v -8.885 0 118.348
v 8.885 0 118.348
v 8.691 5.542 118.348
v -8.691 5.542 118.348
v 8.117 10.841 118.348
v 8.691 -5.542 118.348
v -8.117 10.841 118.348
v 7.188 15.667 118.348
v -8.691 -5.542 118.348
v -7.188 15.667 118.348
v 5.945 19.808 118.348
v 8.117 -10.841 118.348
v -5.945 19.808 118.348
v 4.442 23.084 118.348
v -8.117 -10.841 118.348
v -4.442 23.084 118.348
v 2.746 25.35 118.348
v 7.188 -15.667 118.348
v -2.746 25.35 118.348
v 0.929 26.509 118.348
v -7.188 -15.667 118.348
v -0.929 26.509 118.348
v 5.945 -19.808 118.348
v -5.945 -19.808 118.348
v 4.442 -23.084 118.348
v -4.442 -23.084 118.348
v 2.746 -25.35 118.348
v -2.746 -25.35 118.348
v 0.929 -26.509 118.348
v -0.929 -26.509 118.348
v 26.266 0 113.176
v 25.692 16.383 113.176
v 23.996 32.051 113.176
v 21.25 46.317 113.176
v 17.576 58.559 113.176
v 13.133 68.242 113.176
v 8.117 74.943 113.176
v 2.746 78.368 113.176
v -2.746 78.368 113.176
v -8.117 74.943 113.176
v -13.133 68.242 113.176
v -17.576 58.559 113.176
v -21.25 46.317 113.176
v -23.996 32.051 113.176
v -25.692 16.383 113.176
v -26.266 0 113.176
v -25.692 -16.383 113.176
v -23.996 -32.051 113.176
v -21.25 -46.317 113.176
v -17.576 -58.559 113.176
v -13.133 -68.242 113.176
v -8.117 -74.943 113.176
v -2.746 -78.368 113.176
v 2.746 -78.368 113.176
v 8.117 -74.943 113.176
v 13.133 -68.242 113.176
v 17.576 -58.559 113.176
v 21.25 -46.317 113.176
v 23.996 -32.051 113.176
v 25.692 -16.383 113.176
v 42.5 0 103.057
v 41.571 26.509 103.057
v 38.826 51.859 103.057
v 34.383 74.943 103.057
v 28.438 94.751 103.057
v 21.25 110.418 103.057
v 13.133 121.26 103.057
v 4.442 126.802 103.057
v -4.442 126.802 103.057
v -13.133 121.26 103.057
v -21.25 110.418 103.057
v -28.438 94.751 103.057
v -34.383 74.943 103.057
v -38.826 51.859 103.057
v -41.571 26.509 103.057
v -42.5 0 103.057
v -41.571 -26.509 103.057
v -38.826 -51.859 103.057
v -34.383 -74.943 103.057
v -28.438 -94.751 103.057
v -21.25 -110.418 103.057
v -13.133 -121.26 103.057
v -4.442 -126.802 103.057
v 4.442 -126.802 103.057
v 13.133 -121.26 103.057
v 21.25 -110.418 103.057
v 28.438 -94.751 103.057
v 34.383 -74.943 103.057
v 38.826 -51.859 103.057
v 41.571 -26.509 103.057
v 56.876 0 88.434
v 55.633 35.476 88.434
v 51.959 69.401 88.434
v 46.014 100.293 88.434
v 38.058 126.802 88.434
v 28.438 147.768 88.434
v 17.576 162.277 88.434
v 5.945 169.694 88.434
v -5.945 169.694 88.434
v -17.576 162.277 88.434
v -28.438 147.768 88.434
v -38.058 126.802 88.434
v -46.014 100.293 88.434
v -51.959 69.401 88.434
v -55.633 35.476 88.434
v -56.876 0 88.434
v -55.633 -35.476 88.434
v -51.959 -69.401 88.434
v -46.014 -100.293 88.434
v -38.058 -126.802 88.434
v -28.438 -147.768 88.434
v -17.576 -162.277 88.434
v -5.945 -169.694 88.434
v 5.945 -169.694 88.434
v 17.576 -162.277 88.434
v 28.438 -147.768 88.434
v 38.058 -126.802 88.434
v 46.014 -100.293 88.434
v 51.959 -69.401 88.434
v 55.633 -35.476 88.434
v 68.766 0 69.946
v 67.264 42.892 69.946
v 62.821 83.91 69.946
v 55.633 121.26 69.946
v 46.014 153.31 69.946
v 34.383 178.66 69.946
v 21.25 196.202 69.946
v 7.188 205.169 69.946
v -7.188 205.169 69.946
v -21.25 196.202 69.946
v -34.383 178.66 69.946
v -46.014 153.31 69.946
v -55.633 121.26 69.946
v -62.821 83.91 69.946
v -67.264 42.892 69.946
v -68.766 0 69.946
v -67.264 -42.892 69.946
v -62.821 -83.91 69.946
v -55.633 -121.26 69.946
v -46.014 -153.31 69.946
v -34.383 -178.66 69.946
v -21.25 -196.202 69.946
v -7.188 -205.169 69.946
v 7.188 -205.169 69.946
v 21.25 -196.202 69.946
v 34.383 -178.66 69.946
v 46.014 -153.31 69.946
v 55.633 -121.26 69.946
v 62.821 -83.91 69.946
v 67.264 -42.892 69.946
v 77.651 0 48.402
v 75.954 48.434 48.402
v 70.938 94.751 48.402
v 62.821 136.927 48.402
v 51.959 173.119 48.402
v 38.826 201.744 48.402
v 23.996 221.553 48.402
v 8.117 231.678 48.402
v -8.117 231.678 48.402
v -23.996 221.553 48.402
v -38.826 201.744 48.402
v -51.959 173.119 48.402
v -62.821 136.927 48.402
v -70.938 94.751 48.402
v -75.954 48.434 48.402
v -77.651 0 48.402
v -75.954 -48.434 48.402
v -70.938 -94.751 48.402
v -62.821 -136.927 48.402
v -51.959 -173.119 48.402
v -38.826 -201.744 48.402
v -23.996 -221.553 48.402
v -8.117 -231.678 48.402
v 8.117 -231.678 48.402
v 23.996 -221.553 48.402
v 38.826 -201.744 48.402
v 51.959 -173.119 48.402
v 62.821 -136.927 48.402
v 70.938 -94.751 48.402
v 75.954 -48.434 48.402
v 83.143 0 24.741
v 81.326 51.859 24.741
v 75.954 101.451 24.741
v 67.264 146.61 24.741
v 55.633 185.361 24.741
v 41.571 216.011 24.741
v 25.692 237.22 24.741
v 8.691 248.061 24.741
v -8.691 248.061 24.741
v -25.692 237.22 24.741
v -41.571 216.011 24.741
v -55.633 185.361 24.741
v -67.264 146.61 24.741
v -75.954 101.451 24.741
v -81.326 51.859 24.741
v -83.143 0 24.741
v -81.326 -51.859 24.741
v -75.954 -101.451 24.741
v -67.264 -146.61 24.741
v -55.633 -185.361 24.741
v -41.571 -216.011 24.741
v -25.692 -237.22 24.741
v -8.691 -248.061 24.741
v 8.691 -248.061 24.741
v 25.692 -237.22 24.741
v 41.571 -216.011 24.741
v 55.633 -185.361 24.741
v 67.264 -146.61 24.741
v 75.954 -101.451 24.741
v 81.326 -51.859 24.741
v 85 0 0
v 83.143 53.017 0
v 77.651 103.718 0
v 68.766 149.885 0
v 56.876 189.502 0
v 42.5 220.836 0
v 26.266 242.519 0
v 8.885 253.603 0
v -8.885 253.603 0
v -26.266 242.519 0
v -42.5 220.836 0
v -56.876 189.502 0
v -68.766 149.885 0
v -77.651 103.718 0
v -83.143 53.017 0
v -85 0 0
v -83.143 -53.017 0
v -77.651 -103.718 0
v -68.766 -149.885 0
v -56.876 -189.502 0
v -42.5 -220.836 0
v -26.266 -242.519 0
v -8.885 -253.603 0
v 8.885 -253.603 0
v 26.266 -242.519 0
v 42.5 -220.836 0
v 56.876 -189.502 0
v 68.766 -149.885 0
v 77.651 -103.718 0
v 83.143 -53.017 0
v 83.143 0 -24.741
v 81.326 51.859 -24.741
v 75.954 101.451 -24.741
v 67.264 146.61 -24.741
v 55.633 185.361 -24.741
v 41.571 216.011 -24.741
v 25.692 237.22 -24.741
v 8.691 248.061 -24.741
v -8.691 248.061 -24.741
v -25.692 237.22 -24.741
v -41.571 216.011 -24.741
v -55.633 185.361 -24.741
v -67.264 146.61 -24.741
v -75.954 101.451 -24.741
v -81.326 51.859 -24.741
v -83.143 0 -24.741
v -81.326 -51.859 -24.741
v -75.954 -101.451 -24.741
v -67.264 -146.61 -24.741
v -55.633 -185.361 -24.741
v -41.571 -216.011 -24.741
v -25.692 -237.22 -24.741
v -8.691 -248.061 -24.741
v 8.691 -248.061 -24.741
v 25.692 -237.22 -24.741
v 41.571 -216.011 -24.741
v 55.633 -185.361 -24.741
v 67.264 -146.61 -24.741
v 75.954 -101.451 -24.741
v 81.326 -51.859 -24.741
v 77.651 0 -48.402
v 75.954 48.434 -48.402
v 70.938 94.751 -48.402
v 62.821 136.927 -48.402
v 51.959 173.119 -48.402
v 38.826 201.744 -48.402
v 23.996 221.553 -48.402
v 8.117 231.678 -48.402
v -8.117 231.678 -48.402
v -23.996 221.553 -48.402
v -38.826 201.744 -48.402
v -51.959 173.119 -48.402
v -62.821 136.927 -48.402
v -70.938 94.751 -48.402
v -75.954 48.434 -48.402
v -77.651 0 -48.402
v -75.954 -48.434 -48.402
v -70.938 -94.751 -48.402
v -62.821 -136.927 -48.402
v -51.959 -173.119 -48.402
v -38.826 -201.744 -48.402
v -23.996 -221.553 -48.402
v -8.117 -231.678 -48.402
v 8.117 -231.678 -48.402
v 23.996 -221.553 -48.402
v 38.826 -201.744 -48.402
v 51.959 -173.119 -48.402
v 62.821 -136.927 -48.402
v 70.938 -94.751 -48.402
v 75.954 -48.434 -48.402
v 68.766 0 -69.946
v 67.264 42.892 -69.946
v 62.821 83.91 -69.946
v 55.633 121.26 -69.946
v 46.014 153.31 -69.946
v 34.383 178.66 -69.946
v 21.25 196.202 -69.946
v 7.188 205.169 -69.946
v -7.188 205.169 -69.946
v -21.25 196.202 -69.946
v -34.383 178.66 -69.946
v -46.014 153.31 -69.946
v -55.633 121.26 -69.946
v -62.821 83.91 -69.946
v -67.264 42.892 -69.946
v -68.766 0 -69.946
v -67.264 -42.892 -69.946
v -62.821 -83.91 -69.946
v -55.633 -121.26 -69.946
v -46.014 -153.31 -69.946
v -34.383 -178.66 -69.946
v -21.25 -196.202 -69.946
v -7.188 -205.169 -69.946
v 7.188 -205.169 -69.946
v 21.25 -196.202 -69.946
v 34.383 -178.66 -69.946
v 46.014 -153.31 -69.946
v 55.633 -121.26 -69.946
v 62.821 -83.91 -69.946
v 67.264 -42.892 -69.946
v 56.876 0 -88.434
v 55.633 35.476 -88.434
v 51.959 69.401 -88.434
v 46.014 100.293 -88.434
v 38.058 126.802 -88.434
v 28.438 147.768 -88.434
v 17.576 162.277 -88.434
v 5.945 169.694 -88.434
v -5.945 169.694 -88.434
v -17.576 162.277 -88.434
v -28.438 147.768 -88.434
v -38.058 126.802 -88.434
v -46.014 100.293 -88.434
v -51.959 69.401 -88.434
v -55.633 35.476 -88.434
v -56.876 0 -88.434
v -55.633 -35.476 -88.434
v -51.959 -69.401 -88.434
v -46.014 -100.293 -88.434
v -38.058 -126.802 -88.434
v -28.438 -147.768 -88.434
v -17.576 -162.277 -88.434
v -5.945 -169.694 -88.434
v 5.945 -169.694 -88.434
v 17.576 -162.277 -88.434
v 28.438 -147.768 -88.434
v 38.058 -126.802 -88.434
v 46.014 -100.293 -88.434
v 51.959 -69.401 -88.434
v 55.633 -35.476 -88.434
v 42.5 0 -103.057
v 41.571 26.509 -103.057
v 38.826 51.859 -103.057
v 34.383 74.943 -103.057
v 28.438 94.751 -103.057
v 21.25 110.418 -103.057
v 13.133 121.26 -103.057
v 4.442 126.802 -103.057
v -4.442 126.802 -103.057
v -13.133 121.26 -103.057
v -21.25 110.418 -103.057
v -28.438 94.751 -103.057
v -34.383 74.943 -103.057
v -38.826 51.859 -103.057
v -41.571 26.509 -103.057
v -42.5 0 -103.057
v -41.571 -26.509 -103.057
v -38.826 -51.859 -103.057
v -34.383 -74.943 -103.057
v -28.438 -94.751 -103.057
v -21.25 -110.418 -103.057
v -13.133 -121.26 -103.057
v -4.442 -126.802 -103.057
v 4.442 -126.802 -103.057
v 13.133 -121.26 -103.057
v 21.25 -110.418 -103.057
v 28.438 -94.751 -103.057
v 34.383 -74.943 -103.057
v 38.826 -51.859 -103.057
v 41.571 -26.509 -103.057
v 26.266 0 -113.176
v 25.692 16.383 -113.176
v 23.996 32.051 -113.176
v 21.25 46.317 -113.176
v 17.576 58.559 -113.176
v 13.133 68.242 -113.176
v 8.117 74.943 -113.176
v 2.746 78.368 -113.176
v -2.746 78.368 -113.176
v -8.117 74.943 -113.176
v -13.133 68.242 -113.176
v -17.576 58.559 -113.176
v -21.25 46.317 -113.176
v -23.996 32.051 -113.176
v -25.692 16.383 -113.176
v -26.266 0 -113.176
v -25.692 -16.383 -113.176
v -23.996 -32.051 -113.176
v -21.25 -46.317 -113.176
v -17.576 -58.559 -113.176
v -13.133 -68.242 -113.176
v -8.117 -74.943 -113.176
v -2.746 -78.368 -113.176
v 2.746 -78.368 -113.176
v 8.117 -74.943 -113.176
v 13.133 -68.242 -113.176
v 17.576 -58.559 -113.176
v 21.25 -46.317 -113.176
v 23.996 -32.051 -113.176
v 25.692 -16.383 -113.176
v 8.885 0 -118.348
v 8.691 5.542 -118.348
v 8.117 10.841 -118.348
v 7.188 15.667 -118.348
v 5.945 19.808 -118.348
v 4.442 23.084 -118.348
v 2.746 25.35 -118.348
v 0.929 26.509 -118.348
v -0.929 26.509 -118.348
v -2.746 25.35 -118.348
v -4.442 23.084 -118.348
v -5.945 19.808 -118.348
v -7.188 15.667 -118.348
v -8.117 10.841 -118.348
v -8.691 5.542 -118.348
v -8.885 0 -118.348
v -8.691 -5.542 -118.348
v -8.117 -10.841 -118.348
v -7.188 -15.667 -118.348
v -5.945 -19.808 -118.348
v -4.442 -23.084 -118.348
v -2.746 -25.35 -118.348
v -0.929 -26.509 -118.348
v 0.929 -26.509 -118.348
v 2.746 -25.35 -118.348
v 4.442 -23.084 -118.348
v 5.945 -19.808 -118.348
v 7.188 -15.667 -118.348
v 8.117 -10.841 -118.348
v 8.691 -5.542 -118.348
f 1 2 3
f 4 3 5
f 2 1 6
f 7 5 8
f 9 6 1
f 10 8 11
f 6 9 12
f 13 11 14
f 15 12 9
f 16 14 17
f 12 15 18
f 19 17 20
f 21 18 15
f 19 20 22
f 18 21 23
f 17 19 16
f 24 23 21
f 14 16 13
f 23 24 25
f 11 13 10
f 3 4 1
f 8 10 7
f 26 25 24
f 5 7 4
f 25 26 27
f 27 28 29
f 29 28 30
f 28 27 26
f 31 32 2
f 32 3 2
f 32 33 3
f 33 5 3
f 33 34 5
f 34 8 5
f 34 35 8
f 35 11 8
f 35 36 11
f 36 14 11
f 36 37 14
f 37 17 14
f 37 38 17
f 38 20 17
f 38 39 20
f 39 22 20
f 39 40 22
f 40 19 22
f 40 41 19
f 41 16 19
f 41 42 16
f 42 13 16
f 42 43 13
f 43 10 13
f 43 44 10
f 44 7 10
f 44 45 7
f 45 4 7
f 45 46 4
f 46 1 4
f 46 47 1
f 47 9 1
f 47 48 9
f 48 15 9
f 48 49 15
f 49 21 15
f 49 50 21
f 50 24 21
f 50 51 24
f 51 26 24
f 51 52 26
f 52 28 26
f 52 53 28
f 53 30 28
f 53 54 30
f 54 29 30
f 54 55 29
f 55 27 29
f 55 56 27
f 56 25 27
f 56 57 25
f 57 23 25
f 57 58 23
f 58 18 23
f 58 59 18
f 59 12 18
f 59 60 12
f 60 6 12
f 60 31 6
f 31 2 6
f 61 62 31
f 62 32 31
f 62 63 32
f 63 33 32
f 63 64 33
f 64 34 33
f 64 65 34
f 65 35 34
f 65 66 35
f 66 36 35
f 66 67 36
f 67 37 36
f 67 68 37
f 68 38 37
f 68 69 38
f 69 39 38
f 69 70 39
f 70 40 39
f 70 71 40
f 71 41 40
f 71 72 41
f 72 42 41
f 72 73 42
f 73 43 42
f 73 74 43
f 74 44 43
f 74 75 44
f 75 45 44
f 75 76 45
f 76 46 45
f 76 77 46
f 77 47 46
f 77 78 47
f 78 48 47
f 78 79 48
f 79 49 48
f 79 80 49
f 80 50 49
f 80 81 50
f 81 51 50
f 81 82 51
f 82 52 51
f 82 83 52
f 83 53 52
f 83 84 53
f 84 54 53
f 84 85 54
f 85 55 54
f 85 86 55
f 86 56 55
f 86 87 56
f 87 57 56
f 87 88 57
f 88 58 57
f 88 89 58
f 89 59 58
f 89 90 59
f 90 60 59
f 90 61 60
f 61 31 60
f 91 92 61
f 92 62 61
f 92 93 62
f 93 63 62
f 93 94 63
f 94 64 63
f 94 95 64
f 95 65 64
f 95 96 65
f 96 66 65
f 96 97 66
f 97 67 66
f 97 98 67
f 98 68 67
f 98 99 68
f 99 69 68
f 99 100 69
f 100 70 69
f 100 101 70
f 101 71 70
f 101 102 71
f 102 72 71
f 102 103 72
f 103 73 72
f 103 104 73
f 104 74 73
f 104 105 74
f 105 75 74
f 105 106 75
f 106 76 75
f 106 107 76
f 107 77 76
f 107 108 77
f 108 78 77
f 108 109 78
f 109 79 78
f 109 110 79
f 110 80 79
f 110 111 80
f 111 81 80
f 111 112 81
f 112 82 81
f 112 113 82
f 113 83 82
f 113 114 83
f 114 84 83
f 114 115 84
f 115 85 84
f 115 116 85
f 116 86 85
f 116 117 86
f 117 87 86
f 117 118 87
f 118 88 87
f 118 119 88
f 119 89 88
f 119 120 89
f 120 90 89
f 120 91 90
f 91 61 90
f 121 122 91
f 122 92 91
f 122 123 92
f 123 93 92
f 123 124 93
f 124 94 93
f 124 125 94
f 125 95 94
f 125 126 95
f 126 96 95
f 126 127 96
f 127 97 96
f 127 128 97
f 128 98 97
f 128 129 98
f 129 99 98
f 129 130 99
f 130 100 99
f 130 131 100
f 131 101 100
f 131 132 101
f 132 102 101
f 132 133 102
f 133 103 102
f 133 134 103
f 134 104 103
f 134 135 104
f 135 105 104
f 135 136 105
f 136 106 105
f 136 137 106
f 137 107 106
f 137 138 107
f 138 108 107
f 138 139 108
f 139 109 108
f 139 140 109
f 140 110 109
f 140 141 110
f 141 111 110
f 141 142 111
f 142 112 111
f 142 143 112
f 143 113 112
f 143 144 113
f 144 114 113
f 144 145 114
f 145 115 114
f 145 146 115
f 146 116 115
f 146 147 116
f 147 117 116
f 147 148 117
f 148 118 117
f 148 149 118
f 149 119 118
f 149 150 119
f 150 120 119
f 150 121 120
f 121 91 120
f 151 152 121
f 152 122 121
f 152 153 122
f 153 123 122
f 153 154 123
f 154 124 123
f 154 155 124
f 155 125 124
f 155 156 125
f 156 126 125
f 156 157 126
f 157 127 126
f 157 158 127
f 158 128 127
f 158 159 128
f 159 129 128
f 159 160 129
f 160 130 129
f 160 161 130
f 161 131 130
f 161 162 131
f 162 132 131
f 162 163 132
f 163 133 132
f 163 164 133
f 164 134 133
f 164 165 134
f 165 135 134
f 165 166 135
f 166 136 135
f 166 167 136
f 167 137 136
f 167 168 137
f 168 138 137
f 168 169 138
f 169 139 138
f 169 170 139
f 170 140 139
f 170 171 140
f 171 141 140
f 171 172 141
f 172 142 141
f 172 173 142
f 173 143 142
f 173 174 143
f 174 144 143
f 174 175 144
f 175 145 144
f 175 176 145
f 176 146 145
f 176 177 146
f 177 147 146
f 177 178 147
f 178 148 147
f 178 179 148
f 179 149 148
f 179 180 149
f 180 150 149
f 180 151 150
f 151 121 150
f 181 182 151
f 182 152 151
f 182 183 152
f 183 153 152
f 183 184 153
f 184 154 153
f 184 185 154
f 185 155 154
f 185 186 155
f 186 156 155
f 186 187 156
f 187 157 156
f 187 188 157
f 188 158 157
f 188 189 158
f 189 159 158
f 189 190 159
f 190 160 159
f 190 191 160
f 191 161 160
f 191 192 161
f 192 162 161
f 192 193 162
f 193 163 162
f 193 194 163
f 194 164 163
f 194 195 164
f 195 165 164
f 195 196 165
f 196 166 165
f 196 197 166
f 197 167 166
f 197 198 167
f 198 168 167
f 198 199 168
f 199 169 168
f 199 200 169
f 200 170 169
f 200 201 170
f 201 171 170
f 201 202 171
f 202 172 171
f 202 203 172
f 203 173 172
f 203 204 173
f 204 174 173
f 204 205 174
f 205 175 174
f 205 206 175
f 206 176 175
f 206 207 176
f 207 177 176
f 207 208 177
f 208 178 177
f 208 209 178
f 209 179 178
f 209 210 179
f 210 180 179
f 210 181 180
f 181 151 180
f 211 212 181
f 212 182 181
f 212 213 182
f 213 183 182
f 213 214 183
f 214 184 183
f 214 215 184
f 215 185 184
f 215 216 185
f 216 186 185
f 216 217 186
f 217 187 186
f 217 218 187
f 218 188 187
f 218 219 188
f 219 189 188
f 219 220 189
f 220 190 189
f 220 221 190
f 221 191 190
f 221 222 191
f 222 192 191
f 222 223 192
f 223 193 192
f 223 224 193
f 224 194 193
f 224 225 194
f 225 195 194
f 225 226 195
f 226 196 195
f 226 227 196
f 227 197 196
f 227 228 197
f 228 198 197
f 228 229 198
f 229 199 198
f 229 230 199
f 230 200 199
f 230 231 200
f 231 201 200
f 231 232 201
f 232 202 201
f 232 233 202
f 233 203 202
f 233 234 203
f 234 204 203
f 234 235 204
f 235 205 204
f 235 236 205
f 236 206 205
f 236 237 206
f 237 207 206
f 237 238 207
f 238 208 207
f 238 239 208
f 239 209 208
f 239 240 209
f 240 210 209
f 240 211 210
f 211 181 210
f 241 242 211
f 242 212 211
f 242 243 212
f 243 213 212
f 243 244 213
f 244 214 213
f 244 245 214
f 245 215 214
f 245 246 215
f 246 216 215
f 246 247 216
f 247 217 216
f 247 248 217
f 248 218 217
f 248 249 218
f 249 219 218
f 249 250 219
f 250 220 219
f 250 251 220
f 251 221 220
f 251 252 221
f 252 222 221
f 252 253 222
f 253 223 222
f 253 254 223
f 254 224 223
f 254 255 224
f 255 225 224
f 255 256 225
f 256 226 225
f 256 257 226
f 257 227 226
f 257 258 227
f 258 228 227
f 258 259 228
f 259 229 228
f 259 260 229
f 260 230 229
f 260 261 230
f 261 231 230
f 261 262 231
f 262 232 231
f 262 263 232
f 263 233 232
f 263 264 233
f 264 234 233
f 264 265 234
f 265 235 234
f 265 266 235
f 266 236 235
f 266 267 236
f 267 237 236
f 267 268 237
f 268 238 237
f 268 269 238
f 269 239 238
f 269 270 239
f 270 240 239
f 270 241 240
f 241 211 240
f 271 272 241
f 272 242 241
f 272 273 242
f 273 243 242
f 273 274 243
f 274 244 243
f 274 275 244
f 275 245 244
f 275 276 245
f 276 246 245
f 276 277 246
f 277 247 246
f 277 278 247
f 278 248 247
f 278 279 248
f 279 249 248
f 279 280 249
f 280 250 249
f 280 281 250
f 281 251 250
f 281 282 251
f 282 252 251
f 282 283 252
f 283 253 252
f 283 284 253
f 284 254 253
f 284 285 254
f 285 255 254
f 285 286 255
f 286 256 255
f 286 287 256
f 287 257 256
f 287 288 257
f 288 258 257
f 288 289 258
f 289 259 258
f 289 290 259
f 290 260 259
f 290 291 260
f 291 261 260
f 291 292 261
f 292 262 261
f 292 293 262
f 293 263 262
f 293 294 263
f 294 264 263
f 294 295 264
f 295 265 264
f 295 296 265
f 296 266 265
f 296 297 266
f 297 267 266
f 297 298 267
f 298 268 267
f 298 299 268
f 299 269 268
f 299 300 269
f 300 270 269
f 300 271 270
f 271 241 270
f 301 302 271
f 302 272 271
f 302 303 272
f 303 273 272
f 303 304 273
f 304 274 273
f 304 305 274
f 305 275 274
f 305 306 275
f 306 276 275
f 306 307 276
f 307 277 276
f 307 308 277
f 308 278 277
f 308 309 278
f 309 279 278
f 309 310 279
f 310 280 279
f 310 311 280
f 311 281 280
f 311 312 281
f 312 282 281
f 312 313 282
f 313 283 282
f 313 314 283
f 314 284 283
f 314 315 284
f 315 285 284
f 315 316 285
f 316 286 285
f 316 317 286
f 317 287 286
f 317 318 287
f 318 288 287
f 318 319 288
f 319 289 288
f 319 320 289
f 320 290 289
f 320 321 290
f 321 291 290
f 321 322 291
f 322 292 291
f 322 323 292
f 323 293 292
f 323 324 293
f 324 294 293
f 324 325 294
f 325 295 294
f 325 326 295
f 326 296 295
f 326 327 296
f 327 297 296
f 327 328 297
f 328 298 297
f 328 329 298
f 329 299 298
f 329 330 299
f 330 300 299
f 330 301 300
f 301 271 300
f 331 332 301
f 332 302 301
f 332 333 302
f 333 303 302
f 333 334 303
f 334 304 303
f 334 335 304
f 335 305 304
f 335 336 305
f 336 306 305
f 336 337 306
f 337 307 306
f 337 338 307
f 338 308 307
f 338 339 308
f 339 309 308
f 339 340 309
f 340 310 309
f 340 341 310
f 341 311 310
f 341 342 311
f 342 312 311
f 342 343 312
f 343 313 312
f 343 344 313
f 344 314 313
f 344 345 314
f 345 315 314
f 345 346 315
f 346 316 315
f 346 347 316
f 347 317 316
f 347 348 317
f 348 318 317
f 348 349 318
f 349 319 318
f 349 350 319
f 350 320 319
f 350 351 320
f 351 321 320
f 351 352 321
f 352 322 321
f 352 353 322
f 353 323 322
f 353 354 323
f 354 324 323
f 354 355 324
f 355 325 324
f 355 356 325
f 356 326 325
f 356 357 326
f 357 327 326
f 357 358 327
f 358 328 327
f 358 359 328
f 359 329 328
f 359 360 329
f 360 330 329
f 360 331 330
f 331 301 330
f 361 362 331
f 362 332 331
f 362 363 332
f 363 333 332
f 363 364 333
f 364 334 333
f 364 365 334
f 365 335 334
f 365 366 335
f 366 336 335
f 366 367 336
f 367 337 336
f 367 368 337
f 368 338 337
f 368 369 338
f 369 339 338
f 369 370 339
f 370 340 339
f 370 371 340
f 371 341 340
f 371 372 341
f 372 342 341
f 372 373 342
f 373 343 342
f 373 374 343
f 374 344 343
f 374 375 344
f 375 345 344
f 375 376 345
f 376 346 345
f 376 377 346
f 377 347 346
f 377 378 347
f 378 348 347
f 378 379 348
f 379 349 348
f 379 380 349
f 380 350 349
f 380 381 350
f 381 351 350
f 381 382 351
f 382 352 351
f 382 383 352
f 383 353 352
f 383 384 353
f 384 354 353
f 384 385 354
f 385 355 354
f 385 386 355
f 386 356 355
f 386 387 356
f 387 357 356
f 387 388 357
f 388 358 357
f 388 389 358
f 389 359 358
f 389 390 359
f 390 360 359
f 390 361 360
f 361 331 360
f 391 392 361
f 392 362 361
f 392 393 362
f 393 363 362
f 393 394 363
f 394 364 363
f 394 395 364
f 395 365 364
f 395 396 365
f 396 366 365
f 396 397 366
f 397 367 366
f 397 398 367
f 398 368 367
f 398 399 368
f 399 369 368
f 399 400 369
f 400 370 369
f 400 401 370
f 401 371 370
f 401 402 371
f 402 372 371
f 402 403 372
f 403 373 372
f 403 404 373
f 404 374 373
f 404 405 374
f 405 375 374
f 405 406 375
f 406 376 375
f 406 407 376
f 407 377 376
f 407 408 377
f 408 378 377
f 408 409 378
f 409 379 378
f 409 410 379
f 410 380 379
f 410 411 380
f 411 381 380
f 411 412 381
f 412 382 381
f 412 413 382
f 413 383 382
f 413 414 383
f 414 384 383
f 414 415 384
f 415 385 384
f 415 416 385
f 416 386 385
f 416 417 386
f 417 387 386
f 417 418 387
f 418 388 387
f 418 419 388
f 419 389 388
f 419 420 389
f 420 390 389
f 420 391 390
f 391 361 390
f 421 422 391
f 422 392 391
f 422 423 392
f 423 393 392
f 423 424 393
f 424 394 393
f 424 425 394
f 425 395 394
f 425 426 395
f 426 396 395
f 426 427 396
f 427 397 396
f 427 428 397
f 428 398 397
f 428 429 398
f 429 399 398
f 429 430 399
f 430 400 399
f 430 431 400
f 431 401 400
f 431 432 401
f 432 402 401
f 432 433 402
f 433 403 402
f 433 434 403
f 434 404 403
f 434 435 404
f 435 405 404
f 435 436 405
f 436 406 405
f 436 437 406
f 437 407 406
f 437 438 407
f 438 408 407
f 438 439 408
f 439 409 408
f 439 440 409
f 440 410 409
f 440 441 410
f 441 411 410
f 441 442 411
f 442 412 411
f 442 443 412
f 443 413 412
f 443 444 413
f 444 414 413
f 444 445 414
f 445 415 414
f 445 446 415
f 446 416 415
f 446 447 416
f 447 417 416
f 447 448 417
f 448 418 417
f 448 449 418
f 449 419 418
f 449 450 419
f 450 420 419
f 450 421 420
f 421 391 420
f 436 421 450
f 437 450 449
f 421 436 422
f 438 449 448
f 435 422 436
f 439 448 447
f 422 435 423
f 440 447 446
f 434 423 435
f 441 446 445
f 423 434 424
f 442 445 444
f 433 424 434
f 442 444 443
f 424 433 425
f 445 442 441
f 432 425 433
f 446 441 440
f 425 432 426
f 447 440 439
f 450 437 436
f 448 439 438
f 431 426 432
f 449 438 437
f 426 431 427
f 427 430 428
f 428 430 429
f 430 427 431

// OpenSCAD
// Generated by SolidPython 1.0.1 on 2020-07-29 00:46:46


scale(v = [5, 15, 7]) {
	sphere(r = 17);
}
/***********************************************
*********      SolidPython code:      **********
************************************************
 
# import packages: SolidPython
from solid import *
from solid.utils import *
from itertools import chain, combinations, permutations


class Resize:

    def __init__(self, scad_file):
        self.scad_file = scad_file
        #self.scad_file = import_scad(scad_file)
        # cone/cylinder param:
        self.r1 = 0
        self.r2 = 0
        self.h = 0
        # rectangular prism param:
        self.w = 0
        self.l = 0
        # ellipse param:
        self.r = 0

    # import OpenScad code (file name corresponds to shape)


    # classify shape + parameters
    def assign(self, param1, param2, param3):
        if self.scad_file == 'cone.scad':
            self.r1 = param1
            self.r2 = param2
            self.h = param3
        elif self.scad_file == 'cylinder.scad':
            self.r1 = param1
            self.r2 = param2
            self.h = param3
        elif self.scad_file == 'rectangularPrism.scad':
            self.h = param1
            self.l = param2
            self.w = param3
        else:
            self.r = param1
            self.h = param2

    # resize parameters
    def iterate(self):
        x = range(3, 20, 2)
        i = 1
        if self.scad_file == 'cone.scad':
            tempList = list(permutations(x, 2))
            for temp in tempList:
                param1 = temp[0]
                param2 = temp[1]
                filepath = 'produced_scad_files/' + 'cone' + str(param1) + '_' + str(param2) + '_' + '.scad'
                scad_render_to_file(cylinder(h=param1, r1=param2, r2=0), filepath)

        elif self.scad_file == 'cylinder.scad':
            tempList = list(permutations(x, 3))
            for temp in tempList:
                param1 = temp[0]
                param2 = temp[1]
                filepath = 'produced_scad_files/' + 'cylinder' + str(param1) + '_' + str(param2) + '_' + '.scad'
                scad_render_to_file(cylinder(h=param1, r1=param2, r2=param2), filepath)

        elif self.scad_file == 'rectangularPrism.scad':
            tempList = list(permutations(x, 3))
            for temp in tempList:
                param1 = temp[0]
                param2 = temp[1]
                param3 = temp[2]
                filepath = 'produced_scad_files/' + 'rectangularPrism' + str(param1) + '_' + str(param2) + '_' + str(
                    param3) + '.scad'
                scad_render_to_file(cube(size=(param1, param2, param3)), filepath)

        elif self.scad_file == 'ellipse.scad':
            tempList = list(permutations(x, 4))
            for temp in tempList:
                param1 = temp[0]
                param2 = temp[1]
                param3 = temp[2]
                param4 = temp[3]
                filepath = 'produced_scad_files/' + 'ellipse' + str(param1) + '_' + str(param2) + '_' + str(param3) + '_' + str(param4) + '.scad'
                scad_render_to_file(scale([param1, param2, param3])(sphere(r=param4)), filepath)

    def render_to_scadfile(self):
        scad_render_to_file(scad, 'example.scad') 
 
************************************************/
